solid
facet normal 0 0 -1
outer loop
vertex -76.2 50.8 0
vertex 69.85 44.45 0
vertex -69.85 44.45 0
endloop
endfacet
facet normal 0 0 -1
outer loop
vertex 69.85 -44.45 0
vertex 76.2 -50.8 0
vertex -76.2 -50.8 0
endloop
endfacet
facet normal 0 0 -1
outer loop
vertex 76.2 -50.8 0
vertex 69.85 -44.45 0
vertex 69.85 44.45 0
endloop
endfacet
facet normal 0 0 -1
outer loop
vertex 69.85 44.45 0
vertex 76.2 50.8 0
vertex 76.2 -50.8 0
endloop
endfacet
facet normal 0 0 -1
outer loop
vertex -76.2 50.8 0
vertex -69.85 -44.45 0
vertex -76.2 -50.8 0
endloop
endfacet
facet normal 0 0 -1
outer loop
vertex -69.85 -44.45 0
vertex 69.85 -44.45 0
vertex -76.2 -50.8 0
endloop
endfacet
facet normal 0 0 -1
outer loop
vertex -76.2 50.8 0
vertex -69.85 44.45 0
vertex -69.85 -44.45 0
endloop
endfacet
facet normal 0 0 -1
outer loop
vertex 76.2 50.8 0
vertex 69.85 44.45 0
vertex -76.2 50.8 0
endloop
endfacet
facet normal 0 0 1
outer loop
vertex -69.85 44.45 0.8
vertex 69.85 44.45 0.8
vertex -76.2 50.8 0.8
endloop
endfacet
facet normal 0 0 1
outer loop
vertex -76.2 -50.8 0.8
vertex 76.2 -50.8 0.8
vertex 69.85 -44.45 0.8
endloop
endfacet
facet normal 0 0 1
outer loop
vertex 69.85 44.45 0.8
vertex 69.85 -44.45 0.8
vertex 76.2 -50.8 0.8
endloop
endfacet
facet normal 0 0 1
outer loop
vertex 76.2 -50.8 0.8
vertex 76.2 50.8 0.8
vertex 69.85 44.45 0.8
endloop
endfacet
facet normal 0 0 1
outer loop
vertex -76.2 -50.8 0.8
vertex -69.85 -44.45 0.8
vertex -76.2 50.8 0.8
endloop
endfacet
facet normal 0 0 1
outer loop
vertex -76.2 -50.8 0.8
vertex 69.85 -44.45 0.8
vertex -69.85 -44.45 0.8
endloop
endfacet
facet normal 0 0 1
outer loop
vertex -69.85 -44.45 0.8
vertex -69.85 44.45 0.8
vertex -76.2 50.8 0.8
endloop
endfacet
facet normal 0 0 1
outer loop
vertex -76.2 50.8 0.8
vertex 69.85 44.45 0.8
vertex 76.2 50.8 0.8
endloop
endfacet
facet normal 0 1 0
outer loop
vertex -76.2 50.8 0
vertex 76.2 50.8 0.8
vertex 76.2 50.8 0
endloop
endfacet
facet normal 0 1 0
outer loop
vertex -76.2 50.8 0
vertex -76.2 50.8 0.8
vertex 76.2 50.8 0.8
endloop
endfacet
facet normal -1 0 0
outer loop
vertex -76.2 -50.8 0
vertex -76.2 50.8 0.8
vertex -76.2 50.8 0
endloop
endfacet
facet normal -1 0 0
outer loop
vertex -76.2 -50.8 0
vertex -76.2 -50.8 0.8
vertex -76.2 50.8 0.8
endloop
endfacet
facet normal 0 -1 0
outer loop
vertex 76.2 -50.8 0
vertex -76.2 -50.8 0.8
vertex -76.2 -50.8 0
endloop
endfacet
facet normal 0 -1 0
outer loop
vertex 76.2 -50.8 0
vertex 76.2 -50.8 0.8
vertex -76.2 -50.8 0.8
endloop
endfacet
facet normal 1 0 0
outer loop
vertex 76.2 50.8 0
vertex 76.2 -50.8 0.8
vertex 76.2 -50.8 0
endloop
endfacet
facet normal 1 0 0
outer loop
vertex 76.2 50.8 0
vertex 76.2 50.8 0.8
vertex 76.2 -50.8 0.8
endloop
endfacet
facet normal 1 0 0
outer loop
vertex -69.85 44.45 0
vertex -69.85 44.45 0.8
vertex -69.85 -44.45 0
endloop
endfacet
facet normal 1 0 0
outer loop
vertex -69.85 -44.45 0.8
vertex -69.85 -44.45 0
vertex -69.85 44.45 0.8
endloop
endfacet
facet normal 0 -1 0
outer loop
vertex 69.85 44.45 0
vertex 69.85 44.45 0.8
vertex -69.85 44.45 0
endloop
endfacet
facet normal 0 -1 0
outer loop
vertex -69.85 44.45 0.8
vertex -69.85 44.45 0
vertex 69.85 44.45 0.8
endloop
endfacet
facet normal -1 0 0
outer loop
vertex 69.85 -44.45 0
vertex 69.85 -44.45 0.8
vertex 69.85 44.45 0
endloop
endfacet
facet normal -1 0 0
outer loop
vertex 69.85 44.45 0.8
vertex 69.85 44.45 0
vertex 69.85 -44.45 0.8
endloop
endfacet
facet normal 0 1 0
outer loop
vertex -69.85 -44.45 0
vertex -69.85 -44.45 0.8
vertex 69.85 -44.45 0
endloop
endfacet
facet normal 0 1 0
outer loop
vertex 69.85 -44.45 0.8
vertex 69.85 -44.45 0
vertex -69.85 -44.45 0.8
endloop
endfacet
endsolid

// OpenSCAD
// Luminary Nubble display-contact frame: thin 4x6 in black PLA ring.
// It is captured by the closed door/sight-mat; no front magnets are used.

outer_w = 152.4;  // 6 in
outer_h = 101.6;  // 4 in
opening_w = 139.7; // 5.5 in visible field
opening_h = 88.9;  // 3.5 in visible field
thickness = 0.8;

linear_extrude(height = thickness)
    difference() {
        square([outer_w, outer_h], center = true);
        square([opening_w, opening_h], center = true);
    }
